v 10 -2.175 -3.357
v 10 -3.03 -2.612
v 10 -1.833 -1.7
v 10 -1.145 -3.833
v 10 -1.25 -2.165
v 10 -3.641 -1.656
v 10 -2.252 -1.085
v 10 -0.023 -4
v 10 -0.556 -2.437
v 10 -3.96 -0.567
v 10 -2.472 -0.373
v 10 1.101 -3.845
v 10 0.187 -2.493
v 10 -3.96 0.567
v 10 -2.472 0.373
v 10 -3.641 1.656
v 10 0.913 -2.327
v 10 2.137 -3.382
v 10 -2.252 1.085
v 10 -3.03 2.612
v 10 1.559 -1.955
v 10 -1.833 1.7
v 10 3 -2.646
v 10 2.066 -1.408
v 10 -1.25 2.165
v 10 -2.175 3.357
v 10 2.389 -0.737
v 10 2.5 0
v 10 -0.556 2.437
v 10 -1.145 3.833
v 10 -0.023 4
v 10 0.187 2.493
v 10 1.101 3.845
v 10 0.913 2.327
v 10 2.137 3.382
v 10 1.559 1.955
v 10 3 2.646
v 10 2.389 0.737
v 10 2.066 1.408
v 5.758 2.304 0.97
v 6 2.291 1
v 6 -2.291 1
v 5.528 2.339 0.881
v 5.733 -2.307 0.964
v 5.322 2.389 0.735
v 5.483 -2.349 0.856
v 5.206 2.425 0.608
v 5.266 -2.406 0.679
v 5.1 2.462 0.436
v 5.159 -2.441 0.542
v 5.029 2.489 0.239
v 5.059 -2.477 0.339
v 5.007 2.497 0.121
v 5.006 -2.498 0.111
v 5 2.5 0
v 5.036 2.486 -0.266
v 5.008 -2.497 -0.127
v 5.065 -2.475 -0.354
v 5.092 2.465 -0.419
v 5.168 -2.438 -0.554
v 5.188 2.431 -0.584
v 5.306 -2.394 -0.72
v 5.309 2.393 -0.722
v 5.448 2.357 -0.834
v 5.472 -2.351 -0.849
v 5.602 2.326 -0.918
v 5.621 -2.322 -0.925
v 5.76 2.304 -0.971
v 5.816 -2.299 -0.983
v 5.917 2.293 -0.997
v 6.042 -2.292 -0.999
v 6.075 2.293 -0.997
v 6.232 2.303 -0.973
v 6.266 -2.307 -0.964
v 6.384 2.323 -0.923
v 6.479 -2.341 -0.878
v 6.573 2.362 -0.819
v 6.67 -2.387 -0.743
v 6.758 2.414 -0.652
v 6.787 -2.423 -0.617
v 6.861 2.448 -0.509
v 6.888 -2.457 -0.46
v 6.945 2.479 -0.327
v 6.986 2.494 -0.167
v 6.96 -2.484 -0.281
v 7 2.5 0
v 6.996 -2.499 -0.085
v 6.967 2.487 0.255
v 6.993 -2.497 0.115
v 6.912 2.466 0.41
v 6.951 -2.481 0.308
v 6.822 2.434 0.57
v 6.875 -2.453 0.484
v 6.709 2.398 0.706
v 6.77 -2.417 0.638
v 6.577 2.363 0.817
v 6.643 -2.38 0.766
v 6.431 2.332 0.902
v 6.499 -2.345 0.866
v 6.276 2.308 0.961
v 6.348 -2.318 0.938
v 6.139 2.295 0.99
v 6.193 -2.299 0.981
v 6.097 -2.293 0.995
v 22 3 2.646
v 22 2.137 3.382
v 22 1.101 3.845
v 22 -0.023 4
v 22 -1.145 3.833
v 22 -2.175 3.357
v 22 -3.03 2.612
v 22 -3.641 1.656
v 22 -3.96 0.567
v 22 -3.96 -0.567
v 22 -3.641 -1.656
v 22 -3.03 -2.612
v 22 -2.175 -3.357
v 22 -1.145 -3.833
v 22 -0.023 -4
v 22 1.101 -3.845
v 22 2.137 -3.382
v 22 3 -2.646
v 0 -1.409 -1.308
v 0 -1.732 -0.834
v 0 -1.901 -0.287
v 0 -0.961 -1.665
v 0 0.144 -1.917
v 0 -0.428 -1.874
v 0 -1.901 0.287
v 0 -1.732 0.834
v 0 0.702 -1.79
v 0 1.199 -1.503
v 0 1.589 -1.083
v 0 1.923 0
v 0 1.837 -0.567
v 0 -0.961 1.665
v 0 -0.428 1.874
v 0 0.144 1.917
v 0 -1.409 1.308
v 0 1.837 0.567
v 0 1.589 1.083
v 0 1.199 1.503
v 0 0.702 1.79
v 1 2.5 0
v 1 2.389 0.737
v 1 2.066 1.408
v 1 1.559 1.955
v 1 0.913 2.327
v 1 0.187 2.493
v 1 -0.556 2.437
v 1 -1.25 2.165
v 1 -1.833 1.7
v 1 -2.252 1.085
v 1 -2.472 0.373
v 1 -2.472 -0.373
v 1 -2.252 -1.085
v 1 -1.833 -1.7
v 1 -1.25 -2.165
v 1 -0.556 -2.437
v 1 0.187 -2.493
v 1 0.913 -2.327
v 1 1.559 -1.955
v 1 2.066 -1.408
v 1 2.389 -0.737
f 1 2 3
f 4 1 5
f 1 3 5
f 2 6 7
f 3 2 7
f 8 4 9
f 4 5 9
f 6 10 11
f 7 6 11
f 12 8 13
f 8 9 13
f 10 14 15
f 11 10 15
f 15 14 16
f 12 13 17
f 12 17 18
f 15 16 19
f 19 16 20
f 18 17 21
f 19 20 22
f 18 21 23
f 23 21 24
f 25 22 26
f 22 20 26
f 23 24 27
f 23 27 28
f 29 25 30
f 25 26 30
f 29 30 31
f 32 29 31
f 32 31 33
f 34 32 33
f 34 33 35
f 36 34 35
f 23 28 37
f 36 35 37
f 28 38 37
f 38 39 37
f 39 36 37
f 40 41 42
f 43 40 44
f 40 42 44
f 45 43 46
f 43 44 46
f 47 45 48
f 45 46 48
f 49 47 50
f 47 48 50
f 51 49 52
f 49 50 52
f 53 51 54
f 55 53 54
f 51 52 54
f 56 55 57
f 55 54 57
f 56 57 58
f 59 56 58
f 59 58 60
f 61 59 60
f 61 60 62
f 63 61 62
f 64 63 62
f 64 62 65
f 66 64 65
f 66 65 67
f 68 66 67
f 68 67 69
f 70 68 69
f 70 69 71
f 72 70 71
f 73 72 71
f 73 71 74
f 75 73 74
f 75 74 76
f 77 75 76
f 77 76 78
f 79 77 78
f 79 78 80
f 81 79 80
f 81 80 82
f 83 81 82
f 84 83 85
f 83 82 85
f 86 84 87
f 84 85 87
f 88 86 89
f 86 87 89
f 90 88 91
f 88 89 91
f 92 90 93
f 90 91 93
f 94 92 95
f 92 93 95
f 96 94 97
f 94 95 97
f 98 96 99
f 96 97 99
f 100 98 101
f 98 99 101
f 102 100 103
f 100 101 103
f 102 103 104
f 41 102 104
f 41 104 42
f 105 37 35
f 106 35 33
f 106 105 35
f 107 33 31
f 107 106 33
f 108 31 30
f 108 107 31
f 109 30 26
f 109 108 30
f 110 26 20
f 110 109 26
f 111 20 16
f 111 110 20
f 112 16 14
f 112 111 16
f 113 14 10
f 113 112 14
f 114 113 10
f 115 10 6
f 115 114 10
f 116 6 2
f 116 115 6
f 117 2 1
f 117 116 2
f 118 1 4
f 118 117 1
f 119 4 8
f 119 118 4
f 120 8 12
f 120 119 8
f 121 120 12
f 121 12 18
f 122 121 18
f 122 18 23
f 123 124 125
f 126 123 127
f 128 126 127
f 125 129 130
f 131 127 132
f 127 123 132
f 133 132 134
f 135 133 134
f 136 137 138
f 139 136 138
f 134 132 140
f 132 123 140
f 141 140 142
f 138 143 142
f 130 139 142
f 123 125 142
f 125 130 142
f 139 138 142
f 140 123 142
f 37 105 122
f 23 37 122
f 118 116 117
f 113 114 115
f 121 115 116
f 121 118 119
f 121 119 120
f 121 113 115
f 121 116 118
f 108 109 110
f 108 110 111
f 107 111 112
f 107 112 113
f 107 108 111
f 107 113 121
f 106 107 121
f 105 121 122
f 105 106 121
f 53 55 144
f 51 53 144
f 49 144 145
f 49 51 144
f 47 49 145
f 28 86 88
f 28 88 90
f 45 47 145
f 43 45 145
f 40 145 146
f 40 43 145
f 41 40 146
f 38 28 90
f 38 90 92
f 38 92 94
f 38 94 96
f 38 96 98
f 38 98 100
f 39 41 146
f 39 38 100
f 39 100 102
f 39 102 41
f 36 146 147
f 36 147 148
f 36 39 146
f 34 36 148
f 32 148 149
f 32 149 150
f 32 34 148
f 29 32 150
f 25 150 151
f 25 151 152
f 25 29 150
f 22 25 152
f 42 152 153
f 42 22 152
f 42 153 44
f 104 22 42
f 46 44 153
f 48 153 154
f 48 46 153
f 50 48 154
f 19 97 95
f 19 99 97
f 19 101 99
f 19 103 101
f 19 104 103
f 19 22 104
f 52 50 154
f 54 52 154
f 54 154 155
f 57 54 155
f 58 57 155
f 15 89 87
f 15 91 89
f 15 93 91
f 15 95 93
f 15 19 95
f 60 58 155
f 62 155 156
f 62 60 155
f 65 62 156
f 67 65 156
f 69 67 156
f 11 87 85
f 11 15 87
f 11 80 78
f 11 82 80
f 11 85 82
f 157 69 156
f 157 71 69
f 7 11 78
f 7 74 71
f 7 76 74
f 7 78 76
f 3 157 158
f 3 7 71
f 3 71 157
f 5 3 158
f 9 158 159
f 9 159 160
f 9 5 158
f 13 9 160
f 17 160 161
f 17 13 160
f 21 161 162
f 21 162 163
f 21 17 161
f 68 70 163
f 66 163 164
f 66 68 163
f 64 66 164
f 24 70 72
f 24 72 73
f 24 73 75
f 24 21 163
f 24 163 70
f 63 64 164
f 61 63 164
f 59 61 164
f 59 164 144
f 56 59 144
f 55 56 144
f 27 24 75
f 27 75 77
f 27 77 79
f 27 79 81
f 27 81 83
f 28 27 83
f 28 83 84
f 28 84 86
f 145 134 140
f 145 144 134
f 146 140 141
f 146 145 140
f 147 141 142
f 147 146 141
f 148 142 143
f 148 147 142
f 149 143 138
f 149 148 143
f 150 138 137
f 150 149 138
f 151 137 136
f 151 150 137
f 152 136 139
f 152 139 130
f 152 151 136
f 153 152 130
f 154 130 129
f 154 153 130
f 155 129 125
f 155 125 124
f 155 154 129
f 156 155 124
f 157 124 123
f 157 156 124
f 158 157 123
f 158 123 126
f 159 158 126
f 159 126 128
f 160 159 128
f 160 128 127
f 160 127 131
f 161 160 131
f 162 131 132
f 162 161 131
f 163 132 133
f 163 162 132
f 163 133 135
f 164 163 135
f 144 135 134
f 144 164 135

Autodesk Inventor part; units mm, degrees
ref_plane "YZ Plane" through (0, 0, 0) normal (1, 0, 0) x (0, 1, 0)
ref_plane "XY Plane" through (0, 0, 0) normal (0, 0, 1) x (1, 0, 0)
sketch "Sketch1" plane through (0, 0, 0) normal (0, 0, 1) x (1, 0, 0)
  line L0 (0, 0) -> (51.053, 0) construction
  line L1 (0, 0) -> (0, 2.5)
  line L2 (0, 2.5) -> (10, 2.5)
  line L3 (10, 2.5) -> (10, 4)
  line L4 (10, 4) -> (22, 4)
  line L5 (22, 4) -> (22, 0)
  line L6 (22, 0) -> (0, 0)
  dimension "d0" = 5
  dimension "d1" = 8
  dimension "d2" = 10
  dimension "d3" = 12
revolve "Revolution1" add sketch "Sketch1" angle 360 about axis through (0, 0, 0) along (1, 0, 0)
sketch "Sketch2" plane through (22, 0, 0) normal (1, 0, 0) x (0, 0, -1)
  circle A0 centre (0, 0) radius 4 projected
  circle A1 centre (0, 0) radius 2.5 construction
  line L0 (-2.6458, 3) -> (2.6458, 3)
  arc A2 (2.6458, 3) -> (-2.6458, 3) centre (0, 0) ccw
  dimension "d5" = 3
extrude "Extrusion1" cut sketch "Sketch2" against normal through all contours L0 A0 picked at (-0.6179, 3.1815)
ref_plane "Work Plane1" through (5, 2.5, 0) normal (0, 1, 0) x (-1, 0, 0)
sketch "Sketch3" plane through (5, 2.5, 0) normal (0, 1, 0) x (-1, 0, 0)
  line L0 (-5, 2.5) -> (-5, -2.5) construction
  line L1 (5, 2.5) -> (5, -2.5) construction
  line L2 (-5, 2.6458) -> (-5, -2.6458) construction
  line L3 (-5, 0) -> (5, 0) construction
  point P0 (-1, 0)
  dimension "d8" = 4
hole "Hole1" at (6, 2.5, 0) direction (0, -1, 0) diameter 2 end through all
chamfer "Chamfer1" distance 1 angle 30 1 edges at (0, -2.5, 0) measured on face at (5.3098, -2.0345, -1.4529)
properties part number "P12" material "Aluminium"
